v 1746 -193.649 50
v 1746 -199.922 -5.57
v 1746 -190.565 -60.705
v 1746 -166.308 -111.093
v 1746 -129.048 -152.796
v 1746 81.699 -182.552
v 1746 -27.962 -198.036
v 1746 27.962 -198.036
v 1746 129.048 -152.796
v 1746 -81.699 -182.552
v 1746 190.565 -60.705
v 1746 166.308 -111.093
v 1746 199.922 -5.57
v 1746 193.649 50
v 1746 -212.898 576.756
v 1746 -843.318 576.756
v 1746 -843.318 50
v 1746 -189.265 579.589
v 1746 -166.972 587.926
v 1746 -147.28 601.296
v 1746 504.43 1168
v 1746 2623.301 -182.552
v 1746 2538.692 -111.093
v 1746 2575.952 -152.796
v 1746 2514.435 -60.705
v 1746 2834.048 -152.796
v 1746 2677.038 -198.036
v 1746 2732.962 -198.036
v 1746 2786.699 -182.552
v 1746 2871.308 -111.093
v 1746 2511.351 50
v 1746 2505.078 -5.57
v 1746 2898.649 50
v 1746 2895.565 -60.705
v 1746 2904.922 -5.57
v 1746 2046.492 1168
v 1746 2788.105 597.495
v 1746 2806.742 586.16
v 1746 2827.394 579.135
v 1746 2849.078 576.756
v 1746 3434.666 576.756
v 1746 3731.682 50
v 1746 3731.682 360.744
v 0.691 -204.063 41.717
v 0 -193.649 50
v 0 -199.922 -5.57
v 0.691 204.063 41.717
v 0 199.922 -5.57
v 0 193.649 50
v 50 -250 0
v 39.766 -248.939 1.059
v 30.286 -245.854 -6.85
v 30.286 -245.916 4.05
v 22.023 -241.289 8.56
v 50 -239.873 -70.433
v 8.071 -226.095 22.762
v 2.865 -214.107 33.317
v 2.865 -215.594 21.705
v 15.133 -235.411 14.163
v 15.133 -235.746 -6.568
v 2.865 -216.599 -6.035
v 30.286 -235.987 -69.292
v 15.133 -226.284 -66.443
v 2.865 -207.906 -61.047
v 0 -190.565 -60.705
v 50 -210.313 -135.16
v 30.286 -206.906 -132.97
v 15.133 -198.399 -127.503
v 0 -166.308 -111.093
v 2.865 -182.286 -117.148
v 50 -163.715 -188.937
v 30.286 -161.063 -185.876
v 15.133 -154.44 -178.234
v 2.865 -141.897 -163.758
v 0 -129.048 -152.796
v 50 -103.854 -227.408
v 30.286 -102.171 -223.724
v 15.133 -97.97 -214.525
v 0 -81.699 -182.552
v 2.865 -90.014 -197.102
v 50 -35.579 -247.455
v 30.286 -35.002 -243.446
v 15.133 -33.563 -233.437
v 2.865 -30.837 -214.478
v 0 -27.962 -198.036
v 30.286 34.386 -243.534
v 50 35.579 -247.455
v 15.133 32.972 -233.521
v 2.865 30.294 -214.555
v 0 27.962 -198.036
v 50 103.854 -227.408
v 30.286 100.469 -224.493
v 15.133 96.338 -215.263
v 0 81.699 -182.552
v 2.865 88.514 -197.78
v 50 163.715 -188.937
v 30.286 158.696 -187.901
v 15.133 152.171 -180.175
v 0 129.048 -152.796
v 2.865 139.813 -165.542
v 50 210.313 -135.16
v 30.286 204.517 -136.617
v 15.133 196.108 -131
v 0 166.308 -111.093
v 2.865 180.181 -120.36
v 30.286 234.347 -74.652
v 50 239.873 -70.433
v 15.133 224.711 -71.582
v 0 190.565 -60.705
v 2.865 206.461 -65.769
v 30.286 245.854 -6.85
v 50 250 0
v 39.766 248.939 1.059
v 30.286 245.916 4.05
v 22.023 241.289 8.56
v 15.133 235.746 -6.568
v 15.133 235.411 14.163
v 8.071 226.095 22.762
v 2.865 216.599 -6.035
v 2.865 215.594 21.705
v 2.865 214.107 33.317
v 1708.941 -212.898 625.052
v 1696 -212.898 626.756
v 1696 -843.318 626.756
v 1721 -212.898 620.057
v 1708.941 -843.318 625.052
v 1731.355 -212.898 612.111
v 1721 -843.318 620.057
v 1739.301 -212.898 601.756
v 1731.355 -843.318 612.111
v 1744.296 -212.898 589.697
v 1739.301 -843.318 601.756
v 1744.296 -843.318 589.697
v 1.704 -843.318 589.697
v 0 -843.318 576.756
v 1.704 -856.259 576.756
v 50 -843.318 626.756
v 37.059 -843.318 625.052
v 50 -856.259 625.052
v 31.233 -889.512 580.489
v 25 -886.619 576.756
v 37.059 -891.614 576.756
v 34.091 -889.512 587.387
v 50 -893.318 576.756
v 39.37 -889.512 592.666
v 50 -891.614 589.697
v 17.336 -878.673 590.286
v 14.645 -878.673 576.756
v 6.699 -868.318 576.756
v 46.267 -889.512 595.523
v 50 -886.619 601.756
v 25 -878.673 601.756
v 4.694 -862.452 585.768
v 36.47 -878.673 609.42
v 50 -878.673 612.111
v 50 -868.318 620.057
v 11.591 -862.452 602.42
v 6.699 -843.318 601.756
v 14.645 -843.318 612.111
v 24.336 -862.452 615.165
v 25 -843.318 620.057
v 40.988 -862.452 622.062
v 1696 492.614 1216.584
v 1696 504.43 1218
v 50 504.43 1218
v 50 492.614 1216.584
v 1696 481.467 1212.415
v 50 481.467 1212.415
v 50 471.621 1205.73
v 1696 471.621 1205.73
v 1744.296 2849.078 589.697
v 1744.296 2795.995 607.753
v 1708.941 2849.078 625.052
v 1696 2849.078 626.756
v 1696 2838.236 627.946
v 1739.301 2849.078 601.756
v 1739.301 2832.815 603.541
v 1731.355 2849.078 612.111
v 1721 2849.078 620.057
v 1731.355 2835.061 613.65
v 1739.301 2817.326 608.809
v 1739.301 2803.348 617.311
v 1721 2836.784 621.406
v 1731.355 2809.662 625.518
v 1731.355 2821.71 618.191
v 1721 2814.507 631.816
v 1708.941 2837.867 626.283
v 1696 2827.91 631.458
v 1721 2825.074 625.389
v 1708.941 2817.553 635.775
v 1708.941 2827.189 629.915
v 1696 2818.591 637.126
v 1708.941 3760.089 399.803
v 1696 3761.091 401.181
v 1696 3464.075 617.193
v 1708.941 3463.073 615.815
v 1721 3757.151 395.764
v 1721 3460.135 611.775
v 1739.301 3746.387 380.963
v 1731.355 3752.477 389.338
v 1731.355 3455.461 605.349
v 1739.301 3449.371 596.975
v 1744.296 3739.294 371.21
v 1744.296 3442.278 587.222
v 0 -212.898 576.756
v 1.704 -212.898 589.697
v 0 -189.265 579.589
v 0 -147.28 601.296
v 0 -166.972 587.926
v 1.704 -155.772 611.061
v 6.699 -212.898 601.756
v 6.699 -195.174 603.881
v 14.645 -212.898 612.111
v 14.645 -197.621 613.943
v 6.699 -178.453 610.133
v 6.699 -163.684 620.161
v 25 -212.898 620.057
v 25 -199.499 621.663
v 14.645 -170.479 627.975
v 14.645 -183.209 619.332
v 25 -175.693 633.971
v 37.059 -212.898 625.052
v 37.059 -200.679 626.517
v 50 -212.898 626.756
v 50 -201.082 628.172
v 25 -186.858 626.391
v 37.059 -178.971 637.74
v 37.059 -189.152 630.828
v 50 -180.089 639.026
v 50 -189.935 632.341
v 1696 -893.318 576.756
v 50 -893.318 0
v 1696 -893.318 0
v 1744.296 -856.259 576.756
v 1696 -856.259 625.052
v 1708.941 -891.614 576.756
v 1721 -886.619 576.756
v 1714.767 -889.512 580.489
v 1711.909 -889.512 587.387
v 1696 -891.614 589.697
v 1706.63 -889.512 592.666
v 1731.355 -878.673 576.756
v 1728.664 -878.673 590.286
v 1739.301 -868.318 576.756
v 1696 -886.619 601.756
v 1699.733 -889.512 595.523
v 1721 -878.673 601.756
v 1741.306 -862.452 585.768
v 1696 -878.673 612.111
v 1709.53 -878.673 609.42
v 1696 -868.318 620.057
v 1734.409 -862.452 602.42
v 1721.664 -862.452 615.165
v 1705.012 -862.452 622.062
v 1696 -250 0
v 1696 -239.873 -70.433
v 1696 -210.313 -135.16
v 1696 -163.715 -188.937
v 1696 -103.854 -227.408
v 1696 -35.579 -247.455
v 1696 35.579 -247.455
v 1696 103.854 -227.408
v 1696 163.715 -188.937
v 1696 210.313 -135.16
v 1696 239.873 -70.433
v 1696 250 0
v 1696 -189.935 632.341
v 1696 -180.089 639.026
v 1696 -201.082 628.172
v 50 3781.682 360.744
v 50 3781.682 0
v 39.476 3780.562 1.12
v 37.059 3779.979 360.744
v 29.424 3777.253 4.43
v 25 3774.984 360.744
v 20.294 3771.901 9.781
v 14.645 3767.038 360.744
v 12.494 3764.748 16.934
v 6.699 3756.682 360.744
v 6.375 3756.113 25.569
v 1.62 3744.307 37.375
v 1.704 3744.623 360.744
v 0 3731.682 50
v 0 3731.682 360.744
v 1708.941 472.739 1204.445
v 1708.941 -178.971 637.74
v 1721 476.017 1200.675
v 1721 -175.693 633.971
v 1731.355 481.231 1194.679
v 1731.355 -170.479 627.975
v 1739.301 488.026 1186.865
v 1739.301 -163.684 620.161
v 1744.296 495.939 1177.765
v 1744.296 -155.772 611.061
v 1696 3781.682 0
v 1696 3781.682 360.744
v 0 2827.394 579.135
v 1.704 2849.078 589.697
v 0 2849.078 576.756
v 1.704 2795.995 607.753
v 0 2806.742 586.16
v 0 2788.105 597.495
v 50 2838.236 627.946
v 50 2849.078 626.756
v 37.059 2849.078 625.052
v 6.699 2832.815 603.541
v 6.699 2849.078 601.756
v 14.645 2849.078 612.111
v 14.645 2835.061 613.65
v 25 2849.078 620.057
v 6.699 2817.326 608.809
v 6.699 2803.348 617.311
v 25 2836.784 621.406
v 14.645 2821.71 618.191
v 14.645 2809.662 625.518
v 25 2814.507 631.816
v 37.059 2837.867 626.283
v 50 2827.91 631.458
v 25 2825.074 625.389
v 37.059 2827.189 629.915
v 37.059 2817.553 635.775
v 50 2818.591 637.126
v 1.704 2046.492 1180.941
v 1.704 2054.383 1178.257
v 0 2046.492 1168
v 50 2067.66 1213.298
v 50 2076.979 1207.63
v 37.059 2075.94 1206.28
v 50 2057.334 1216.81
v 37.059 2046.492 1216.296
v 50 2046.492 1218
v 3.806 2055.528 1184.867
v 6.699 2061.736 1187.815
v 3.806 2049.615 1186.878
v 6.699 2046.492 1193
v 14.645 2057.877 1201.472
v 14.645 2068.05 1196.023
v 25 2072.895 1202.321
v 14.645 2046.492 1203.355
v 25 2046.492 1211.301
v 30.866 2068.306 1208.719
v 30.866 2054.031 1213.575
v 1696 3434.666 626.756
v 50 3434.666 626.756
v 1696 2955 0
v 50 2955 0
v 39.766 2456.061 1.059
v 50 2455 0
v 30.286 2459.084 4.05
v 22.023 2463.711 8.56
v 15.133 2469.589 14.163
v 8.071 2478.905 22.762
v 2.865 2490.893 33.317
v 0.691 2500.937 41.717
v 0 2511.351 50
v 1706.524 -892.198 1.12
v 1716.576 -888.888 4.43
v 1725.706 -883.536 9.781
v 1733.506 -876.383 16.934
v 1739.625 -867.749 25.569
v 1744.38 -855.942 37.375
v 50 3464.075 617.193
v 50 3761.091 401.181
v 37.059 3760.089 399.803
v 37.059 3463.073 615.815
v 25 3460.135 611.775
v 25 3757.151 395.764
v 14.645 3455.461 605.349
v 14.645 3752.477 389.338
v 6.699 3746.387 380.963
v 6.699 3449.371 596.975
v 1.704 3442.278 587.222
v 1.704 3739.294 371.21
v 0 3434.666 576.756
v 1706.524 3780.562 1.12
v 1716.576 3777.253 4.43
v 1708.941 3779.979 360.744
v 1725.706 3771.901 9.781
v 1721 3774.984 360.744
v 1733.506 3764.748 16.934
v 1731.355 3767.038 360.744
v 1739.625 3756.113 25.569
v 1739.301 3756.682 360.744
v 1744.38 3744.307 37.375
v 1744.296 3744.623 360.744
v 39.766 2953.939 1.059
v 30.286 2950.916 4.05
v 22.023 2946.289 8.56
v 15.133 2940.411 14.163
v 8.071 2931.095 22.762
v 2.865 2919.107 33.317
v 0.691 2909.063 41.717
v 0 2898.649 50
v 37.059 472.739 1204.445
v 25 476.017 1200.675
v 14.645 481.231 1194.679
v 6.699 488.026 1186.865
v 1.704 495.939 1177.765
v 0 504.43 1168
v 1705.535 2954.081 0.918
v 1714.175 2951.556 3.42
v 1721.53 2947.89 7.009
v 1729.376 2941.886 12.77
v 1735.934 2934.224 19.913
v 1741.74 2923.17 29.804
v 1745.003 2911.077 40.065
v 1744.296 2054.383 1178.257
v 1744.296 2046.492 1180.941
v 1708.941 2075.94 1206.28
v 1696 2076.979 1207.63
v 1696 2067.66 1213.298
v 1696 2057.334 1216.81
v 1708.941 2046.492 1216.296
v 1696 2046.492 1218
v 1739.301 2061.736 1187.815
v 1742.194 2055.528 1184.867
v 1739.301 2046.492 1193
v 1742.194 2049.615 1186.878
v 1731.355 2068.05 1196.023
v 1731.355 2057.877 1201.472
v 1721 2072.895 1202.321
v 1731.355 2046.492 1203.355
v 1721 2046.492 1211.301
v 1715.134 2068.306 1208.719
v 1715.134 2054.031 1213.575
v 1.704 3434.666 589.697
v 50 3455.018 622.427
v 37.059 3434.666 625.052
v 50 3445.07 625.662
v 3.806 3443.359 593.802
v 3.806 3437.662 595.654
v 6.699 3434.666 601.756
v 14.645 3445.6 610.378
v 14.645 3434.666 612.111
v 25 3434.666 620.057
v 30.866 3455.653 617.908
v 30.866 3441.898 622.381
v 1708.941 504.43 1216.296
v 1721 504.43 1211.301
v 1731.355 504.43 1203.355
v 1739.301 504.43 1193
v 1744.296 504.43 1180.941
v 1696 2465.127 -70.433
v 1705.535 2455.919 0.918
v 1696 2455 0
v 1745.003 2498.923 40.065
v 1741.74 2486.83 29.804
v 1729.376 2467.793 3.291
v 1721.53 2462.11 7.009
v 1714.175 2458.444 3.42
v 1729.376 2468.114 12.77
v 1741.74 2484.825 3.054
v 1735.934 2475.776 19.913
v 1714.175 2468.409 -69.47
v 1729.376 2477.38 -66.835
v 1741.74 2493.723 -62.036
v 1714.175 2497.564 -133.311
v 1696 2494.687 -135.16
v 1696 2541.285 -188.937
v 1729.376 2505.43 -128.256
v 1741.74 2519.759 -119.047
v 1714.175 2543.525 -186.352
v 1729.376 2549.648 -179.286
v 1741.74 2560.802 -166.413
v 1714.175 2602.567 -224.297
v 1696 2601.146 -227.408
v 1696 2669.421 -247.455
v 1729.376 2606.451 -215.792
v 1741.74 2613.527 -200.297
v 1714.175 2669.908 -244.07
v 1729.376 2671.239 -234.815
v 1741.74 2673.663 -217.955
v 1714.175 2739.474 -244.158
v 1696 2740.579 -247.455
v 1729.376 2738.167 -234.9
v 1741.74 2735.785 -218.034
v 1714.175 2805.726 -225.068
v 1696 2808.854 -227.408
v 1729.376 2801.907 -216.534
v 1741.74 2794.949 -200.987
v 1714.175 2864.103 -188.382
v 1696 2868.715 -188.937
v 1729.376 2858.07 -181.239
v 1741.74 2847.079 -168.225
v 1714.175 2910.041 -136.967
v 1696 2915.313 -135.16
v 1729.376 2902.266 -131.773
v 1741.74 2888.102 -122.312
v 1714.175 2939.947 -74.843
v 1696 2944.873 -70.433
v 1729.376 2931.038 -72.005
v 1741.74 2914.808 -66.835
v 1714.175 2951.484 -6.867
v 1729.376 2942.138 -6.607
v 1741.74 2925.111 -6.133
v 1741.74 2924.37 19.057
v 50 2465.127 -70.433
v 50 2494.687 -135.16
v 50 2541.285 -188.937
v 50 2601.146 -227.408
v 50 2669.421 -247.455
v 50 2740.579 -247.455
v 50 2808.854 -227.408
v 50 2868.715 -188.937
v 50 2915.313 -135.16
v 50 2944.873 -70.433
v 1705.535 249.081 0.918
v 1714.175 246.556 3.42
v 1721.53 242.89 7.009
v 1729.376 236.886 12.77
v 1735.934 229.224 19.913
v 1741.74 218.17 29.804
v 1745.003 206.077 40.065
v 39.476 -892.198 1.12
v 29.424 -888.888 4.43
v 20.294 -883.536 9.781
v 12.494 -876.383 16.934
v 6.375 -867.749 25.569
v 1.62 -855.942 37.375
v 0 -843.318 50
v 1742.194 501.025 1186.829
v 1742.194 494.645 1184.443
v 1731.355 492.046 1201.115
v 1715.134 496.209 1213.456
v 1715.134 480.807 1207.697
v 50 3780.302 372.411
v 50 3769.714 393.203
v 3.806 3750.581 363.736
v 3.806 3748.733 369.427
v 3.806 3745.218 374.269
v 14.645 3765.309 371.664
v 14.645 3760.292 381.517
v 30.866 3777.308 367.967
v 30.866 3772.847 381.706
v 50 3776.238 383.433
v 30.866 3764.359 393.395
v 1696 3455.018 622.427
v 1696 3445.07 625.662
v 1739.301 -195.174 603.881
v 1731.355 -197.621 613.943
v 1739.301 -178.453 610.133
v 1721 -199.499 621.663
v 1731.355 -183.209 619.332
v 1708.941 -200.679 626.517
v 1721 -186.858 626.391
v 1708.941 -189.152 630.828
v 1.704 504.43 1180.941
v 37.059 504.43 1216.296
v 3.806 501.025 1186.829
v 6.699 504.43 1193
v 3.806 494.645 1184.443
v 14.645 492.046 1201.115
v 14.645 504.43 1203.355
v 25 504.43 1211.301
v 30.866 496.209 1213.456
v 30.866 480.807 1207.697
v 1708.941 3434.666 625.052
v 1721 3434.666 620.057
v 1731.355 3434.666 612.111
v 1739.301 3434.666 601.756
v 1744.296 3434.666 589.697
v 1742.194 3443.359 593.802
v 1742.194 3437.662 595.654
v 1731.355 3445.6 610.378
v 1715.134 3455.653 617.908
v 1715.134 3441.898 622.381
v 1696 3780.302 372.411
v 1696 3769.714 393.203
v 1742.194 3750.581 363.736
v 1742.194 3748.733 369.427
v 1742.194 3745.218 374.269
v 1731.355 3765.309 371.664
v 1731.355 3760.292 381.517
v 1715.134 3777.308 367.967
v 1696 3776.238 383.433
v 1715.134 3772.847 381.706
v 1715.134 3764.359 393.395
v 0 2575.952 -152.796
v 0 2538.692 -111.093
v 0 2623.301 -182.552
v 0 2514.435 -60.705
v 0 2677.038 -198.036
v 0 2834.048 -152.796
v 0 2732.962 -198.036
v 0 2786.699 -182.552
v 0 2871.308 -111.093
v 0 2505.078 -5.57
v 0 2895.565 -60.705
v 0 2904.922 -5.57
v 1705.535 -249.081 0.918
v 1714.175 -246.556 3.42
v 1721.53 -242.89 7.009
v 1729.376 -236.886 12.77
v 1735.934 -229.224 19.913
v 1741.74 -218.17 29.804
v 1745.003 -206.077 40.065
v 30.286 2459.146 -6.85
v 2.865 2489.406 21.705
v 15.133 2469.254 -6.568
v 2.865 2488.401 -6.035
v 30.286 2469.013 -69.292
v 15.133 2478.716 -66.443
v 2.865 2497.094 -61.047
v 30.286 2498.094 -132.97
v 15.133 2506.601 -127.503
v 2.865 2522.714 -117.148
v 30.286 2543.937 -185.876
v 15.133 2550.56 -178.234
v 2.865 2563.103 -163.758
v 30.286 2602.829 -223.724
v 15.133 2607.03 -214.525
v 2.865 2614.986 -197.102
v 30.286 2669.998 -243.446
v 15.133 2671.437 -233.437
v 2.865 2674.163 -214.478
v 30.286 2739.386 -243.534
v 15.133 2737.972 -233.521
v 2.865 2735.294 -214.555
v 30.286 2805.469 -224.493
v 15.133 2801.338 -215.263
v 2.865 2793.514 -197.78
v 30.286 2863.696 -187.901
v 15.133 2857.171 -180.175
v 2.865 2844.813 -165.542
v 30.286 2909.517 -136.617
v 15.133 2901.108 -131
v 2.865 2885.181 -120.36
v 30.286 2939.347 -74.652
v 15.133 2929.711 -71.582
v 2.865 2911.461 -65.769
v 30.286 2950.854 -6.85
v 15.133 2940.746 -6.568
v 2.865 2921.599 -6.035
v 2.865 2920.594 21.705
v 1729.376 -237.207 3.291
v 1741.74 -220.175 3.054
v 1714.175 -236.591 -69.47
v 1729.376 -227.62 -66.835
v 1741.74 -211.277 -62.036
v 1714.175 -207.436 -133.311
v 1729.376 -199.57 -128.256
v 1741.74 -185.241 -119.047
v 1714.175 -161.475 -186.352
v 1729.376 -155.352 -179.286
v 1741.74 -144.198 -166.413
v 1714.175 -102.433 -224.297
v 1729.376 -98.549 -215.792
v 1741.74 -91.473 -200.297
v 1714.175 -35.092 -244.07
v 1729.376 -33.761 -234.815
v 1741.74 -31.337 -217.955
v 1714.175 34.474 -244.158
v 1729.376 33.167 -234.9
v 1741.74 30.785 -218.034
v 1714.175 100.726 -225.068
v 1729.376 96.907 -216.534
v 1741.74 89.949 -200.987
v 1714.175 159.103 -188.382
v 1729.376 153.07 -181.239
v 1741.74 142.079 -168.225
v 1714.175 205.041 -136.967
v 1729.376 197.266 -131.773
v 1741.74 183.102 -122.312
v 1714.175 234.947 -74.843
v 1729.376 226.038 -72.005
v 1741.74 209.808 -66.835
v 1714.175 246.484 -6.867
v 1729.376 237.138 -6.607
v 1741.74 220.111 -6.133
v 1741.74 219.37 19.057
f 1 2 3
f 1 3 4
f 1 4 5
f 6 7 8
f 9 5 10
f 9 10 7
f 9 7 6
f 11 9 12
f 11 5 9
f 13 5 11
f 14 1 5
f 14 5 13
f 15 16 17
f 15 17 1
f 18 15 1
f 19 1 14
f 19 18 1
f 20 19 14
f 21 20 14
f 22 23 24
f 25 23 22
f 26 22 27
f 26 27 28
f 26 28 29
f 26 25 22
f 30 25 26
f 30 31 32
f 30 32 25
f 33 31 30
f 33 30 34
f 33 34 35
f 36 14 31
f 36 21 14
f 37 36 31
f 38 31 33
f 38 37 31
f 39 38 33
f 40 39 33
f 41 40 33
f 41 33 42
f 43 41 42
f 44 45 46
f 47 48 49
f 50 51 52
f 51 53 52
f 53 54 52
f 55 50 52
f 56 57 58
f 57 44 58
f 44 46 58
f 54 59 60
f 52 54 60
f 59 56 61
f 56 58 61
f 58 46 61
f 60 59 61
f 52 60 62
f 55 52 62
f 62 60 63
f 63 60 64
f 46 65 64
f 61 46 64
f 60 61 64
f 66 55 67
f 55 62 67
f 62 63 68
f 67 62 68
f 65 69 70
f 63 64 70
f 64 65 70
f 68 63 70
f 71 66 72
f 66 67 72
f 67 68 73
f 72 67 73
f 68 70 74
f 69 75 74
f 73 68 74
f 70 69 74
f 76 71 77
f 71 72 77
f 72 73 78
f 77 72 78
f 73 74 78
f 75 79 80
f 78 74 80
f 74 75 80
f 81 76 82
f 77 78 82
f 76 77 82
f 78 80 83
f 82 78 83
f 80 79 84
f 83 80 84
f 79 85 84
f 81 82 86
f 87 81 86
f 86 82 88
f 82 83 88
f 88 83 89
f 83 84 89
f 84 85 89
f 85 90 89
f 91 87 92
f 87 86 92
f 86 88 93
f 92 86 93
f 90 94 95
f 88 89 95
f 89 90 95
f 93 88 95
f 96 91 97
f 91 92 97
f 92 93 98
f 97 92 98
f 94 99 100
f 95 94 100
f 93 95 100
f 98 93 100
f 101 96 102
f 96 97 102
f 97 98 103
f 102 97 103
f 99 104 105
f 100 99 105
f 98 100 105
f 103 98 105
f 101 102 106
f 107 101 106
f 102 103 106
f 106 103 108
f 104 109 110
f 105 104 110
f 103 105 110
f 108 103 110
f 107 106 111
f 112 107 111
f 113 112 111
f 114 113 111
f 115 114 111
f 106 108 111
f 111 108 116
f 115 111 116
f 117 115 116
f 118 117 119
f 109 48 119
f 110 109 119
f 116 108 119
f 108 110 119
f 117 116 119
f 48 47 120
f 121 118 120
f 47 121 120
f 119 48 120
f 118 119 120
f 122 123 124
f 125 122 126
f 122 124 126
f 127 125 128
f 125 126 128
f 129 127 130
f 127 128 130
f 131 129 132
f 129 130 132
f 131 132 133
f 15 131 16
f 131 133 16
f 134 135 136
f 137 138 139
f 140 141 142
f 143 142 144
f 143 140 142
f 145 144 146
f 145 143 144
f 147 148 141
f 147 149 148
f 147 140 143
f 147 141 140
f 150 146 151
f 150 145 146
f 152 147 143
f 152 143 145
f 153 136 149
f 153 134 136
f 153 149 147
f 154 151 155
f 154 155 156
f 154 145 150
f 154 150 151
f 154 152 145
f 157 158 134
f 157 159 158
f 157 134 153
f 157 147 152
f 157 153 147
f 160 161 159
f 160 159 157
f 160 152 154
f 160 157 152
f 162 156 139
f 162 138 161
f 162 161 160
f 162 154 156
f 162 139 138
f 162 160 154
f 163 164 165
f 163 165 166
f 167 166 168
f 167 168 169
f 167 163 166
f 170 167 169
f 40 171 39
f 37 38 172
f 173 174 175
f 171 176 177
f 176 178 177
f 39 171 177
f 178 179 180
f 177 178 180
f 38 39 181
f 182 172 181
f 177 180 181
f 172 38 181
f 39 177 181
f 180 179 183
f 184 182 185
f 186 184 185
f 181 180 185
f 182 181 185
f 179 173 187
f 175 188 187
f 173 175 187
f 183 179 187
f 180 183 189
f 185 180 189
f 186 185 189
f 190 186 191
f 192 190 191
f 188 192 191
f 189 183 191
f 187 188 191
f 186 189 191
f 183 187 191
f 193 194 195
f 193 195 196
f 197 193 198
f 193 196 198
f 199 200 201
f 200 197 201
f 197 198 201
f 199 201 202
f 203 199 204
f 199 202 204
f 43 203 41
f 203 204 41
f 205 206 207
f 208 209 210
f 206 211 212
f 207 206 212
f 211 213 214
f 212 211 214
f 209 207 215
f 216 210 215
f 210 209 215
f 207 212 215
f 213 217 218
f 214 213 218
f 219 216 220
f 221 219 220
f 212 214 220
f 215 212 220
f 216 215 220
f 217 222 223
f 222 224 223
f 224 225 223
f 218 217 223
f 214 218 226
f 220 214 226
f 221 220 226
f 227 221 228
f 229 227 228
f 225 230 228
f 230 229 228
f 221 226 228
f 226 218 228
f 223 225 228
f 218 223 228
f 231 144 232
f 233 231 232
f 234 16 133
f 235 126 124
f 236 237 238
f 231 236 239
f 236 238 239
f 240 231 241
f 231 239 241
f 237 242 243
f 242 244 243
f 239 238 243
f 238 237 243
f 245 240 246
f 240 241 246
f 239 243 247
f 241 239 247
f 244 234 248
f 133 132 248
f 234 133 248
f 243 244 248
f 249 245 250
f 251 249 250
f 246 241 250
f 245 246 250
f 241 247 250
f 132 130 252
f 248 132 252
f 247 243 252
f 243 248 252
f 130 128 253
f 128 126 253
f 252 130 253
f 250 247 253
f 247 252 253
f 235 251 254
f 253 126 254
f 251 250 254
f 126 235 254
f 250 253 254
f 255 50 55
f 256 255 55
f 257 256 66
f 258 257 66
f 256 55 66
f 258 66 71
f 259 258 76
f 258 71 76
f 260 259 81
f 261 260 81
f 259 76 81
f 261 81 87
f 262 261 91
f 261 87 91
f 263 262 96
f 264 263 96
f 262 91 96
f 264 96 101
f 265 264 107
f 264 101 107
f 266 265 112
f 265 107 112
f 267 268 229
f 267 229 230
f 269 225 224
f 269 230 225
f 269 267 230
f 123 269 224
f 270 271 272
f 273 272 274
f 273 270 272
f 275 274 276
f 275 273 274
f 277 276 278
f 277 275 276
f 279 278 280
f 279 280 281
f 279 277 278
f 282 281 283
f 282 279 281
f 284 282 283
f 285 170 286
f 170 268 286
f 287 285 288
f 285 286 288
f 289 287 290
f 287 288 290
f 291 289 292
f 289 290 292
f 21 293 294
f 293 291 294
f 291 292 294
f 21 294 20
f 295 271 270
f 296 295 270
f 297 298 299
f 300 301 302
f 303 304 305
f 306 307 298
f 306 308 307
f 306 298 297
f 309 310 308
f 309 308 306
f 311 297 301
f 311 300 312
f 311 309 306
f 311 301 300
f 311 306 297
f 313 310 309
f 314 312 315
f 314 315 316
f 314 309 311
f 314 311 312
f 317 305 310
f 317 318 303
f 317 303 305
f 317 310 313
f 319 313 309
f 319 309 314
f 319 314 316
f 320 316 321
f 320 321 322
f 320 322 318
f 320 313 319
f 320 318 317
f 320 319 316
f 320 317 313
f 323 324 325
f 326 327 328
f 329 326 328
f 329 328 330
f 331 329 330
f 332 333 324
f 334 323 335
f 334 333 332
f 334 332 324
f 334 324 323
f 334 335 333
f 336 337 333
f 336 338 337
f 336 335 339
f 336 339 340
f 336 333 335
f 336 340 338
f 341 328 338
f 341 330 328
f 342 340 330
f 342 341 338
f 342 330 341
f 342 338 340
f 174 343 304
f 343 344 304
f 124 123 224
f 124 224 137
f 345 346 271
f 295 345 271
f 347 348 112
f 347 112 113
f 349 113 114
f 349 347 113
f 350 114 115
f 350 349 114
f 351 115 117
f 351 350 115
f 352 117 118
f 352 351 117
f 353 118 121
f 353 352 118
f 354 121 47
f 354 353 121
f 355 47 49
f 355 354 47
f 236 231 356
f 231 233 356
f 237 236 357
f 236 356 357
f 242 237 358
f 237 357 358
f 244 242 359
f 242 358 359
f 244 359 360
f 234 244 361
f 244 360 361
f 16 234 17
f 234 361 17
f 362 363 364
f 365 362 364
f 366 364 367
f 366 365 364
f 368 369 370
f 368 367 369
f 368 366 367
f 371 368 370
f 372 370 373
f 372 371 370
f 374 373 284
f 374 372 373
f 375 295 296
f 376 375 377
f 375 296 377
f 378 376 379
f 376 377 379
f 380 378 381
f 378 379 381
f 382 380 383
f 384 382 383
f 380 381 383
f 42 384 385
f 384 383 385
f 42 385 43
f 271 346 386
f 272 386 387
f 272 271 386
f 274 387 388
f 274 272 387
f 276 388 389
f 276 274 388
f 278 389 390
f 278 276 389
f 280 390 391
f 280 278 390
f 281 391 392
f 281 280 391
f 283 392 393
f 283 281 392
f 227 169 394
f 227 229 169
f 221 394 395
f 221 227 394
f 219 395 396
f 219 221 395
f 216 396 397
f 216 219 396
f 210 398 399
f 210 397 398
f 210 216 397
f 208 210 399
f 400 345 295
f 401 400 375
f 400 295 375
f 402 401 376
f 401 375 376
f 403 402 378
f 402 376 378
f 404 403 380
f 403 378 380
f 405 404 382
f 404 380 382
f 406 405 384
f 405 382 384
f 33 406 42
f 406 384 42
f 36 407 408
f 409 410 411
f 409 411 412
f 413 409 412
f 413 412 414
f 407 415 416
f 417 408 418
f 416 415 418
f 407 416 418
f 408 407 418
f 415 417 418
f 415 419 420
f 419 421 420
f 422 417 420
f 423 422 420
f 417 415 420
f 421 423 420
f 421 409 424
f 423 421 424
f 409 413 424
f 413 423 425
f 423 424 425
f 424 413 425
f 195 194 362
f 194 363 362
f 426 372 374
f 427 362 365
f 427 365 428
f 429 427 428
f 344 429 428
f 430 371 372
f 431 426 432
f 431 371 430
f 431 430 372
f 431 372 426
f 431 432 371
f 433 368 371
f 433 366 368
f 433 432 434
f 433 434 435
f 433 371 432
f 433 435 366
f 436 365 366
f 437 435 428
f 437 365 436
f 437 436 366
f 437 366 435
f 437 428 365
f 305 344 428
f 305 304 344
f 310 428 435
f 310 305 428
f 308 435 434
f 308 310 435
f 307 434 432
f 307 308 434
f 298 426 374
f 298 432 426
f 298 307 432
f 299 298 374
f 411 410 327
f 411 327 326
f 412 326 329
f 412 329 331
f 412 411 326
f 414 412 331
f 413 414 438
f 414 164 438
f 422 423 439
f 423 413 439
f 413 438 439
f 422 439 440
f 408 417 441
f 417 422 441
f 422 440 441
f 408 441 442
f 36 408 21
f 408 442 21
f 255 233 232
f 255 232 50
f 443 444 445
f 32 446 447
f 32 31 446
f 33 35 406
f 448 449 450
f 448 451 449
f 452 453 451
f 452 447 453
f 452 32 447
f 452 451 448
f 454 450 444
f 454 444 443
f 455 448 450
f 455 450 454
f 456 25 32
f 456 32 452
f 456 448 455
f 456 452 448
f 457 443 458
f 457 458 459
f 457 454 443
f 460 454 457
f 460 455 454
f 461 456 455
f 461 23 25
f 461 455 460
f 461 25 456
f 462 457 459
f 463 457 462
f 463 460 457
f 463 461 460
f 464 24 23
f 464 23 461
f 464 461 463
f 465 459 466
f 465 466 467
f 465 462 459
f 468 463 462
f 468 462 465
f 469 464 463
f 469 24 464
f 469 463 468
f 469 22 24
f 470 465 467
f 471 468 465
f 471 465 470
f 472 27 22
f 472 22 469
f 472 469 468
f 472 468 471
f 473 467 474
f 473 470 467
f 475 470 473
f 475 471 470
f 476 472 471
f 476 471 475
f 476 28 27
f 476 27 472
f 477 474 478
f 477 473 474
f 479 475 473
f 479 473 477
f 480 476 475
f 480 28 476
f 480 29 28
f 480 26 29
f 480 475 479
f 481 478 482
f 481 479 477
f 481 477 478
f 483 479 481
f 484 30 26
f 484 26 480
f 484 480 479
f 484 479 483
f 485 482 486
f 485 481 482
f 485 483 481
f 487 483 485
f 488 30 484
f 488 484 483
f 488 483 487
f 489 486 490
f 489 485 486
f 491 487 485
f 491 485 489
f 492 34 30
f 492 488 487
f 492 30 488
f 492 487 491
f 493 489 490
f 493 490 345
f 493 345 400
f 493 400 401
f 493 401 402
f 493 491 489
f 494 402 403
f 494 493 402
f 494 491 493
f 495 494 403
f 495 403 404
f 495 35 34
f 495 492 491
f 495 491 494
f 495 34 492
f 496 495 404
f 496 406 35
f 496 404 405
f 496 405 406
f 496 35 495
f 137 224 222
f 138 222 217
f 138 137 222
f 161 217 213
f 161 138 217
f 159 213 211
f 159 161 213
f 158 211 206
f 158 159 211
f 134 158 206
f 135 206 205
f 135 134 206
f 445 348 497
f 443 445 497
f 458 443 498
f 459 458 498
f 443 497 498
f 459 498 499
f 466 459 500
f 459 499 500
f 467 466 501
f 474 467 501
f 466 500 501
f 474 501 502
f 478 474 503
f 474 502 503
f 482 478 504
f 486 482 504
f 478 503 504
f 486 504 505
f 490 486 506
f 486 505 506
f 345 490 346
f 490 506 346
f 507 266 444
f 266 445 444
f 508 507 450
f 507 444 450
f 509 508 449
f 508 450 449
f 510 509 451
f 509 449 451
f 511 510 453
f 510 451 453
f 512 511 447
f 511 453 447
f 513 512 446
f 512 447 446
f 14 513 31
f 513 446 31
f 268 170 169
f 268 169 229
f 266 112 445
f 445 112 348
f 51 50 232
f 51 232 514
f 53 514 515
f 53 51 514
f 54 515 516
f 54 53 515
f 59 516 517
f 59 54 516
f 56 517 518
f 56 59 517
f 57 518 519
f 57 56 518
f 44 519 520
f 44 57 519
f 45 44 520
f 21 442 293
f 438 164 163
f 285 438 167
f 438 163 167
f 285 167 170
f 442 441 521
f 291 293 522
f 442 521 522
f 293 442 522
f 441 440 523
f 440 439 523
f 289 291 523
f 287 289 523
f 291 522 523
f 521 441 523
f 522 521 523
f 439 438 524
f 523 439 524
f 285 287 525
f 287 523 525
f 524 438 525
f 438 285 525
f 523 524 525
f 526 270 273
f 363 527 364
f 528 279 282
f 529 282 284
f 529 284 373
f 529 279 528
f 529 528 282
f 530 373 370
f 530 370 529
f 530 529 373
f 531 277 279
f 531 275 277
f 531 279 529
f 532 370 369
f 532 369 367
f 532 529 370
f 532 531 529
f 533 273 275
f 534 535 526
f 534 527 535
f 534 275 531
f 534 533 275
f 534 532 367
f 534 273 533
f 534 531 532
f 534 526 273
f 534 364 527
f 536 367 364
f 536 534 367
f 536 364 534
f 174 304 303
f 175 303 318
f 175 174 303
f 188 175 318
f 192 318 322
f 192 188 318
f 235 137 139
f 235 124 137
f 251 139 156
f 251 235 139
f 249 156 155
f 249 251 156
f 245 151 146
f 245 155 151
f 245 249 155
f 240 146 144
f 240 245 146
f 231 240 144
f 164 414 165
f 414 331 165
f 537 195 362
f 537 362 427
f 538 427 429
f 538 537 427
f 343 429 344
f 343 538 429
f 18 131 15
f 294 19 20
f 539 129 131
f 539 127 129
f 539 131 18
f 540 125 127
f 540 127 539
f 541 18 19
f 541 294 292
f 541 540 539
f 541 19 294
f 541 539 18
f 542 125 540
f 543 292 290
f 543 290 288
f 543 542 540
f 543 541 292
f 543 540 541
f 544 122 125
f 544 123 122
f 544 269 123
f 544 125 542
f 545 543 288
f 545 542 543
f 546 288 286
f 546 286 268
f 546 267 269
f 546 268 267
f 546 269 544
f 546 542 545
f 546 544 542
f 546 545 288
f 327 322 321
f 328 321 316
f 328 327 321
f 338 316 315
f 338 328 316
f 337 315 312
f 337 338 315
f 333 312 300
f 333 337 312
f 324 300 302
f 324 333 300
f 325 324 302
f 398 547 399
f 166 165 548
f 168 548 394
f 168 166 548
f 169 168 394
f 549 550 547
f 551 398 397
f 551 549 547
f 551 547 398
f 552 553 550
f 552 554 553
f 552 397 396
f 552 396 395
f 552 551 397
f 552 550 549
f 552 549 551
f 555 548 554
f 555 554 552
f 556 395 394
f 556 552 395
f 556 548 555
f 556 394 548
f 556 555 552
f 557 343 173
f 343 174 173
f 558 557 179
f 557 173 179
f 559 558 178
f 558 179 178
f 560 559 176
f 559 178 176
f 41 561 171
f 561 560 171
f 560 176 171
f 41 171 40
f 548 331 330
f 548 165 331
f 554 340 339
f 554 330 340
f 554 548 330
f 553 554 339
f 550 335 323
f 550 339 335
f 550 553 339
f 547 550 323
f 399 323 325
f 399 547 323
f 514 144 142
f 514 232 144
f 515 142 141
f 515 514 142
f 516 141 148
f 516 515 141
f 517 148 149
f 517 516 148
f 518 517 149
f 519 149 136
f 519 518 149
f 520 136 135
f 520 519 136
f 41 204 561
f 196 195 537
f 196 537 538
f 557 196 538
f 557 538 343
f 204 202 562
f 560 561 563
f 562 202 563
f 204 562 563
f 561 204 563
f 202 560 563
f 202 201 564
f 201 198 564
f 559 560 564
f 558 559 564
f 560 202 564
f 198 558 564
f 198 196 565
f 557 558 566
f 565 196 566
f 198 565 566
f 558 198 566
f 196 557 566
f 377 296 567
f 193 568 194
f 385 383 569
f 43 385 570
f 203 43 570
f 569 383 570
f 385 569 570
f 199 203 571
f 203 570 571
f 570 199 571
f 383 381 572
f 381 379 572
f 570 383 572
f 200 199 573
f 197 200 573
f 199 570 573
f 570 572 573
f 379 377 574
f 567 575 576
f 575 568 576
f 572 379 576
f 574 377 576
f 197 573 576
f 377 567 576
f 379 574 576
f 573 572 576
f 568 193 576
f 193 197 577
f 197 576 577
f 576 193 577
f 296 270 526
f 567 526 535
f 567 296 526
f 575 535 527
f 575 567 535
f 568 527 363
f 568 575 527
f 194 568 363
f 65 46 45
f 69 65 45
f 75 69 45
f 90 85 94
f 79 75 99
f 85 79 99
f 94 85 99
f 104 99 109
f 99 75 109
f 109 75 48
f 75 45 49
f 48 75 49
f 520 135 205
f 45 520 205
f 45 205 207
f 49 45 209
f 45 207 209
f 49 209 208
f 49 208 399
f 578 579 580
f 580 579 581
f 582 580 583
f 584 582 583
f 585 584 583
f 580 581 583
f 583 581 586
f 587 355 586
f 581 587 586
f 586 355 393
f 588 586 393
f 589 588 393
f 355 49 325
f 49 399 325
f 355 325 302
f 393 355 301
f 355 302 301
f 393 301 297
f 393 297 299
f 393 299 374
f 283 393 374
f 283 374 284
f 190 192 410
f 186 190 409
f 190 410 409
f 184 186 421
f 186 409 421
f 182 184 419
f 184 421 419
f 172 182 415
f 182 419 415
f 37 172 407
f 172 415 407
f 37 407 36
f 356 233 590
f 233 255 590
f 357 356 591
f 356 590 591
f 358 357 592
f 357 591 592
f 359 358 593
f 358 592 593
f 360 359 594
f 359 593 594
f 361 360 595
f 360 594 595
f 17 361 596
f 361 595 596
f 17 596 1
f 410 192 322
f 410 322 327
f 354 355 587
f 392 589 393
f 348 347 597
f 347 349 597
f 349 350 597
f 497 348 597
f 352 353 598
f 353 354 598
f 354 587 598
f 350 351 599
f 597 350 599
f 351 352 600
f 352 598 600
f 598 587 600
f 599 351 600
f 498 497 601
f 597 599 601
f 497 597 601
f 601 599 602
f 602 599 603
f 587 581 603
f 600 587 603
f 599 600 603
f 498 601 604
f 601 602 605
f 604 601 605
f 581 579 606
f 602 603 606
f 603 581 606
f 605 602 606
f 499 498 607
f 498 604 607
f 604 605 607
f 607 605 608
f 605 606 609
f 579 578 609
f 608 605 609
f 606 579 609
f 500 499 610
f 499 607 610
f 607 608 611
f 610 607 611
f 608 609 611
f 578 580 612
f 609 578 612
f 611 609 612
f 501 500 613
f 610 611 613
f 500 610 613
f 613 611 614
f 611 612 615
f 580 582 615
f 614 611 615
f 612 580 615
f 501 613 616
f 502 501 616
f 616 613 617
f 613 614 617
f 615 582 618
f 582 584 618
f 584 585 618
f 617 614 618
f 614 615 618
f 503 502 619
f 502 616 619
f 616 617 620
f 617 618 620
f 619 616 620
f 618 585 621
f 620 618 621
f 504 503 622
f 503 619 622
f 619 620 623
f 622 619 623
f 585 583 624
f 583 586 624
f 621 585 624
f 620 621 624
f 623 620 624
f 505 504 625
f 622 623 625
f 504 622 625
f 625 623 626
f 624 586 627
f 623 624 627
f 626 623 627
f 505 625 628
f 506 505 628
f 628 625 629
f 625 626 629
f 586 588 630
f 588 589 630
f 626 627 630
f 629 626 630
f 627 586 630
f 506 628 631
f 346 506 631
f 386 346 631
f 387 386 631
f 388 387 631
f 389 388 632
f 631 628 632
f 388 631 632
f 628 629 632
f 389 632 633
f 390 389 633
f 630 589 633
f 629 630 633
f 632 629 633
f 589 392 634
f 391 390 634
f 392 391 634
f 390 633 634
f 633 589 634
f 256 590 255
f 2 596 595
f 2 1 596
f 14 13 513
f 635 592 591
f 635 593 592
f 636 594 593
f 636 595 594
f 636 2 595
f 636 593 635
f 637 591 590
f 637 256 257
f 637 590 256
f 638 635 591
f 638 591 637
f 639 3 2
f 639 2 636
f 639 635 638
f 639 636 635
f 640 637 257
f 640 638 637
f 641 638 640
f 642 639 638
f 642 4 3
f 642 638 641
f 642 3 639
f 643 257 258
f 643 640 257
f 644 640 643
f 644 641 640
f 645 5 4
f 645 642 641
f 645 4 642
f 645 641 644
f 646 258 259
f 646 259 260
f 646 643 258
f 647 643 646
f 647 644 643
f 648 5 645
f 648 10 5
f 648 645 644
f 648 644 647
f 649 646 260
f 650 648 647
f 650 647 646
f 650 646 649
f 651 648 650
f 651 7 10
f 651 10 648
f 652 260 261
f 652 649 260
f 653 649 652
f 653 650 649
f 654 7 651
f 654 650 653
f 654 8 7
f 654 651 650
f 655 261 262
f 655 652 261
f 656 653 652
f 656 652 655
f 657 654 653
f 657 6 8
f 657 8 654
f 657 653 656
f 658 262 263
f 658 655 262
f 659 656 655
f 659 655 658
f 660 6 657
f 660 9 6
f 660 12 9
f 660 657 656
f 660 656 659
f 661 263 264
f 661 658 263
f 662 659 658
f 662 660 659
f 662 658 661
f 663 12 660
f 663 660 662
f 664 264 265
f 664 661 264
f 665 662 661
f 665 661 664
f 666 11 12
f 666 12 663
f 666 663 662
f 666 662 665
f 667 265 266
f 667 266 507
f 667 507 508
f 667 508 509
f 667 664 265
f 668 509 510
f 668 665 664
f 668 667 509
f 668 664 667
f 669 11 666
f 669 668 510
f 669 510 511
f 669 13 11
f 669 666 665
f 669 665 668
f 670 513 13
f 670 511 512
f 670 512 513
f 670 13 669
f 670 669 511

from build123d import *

# Parameters (mm, degrees)
F1_DEPTH = 1746
F2_R     = 50


with BuildPart() as f1:
    # F0 (on Right) → F1 (new body)
    with BuildSketch(Plane.YZ):
        with BuildLine():
            Line((-893.317626, 0), (-250, 0))
            ThreePointArc((-250, 0), (0, -250), (250, 0))
            Line((250, 0), (2455, 0))
            ThreePointArc((2455, 0), (2705, -250), (2955, 0))
            Line((2955, 0), (3781.682374, 0))
            Line((3781.682374, 0), (3781.682374, 386.205596))
            Line((3781.682374, 386.205596), (3450.925427, 626.756124))
            Line((3450.925427, 626.756124), (2832.071233, 626.756124))
            Line((2832.071233, 626.756124), (2063.499264, 1218))
            Line((2063.499264, 1218), (485.731525, 1218))
            Line((485.731525, 1218), (-194.199075, 626.756124))
            Line((-194.199075, 626.756124), (-893.317626, 626.756124))
            Line((-893.317626, 626.756124), (-893.317626, 0))
        make_face()
    extrude(amount=F1_DEPTH)

    # F2
    f2_edges = [f1.edges().sort_by_distance(p)[0] for p in [
        (1746, -543.75835, 626.756124),
        (1746, -893.317626, 313.378062),
        (1746, -571.658813, 0),
        (1746, 0, -250),
        (1746, 1352.5, 0),
        (1746, 2705, -250),
        (1746, 3368.341187, 0),
        (1746, 3781.682374, 193.102798),
        (1746, 3616.3039, 506.48086),
        (1746, 3141.49833, 626.756124),
        (1746, 2447.785249, 922.378062),
        (1746, 1274.615395, 1218),
        (1746, 145.766225, 922.378062),
        (0, -543.75835, 626.756124),
        (0, -893.317626, 313.378062),
        (0, -571.658813, 0),
        (0, 0, -250),
        (0, 1352.5, 0),
        (0, 2705, -250),
        (0, 3368.341187, 0),
        (0, 3781.682374, 193.102798),
        (0, 3616.3039, 506.48086),
        (0, 3141.49833, 626.756124),
        (0, 2447.785249, 922.378062),
        (0, 1274.615395, 1218),
        (0, 145.766225, 922.378062),
        (873, 485.731525, 1218),
        (873, -194.199075, 626.756124),
        (873, 2832.071233, 626.756124),
        (873, 2063.499264, 1218),
        (873, 3781.682374, 386.205596),
        (873, 3450.925427, 626.756124),
        (873, -893.317626, 626.756124),
    ]]
    fillet(f2_edges, radius=F2_R)


solid = f1.part
